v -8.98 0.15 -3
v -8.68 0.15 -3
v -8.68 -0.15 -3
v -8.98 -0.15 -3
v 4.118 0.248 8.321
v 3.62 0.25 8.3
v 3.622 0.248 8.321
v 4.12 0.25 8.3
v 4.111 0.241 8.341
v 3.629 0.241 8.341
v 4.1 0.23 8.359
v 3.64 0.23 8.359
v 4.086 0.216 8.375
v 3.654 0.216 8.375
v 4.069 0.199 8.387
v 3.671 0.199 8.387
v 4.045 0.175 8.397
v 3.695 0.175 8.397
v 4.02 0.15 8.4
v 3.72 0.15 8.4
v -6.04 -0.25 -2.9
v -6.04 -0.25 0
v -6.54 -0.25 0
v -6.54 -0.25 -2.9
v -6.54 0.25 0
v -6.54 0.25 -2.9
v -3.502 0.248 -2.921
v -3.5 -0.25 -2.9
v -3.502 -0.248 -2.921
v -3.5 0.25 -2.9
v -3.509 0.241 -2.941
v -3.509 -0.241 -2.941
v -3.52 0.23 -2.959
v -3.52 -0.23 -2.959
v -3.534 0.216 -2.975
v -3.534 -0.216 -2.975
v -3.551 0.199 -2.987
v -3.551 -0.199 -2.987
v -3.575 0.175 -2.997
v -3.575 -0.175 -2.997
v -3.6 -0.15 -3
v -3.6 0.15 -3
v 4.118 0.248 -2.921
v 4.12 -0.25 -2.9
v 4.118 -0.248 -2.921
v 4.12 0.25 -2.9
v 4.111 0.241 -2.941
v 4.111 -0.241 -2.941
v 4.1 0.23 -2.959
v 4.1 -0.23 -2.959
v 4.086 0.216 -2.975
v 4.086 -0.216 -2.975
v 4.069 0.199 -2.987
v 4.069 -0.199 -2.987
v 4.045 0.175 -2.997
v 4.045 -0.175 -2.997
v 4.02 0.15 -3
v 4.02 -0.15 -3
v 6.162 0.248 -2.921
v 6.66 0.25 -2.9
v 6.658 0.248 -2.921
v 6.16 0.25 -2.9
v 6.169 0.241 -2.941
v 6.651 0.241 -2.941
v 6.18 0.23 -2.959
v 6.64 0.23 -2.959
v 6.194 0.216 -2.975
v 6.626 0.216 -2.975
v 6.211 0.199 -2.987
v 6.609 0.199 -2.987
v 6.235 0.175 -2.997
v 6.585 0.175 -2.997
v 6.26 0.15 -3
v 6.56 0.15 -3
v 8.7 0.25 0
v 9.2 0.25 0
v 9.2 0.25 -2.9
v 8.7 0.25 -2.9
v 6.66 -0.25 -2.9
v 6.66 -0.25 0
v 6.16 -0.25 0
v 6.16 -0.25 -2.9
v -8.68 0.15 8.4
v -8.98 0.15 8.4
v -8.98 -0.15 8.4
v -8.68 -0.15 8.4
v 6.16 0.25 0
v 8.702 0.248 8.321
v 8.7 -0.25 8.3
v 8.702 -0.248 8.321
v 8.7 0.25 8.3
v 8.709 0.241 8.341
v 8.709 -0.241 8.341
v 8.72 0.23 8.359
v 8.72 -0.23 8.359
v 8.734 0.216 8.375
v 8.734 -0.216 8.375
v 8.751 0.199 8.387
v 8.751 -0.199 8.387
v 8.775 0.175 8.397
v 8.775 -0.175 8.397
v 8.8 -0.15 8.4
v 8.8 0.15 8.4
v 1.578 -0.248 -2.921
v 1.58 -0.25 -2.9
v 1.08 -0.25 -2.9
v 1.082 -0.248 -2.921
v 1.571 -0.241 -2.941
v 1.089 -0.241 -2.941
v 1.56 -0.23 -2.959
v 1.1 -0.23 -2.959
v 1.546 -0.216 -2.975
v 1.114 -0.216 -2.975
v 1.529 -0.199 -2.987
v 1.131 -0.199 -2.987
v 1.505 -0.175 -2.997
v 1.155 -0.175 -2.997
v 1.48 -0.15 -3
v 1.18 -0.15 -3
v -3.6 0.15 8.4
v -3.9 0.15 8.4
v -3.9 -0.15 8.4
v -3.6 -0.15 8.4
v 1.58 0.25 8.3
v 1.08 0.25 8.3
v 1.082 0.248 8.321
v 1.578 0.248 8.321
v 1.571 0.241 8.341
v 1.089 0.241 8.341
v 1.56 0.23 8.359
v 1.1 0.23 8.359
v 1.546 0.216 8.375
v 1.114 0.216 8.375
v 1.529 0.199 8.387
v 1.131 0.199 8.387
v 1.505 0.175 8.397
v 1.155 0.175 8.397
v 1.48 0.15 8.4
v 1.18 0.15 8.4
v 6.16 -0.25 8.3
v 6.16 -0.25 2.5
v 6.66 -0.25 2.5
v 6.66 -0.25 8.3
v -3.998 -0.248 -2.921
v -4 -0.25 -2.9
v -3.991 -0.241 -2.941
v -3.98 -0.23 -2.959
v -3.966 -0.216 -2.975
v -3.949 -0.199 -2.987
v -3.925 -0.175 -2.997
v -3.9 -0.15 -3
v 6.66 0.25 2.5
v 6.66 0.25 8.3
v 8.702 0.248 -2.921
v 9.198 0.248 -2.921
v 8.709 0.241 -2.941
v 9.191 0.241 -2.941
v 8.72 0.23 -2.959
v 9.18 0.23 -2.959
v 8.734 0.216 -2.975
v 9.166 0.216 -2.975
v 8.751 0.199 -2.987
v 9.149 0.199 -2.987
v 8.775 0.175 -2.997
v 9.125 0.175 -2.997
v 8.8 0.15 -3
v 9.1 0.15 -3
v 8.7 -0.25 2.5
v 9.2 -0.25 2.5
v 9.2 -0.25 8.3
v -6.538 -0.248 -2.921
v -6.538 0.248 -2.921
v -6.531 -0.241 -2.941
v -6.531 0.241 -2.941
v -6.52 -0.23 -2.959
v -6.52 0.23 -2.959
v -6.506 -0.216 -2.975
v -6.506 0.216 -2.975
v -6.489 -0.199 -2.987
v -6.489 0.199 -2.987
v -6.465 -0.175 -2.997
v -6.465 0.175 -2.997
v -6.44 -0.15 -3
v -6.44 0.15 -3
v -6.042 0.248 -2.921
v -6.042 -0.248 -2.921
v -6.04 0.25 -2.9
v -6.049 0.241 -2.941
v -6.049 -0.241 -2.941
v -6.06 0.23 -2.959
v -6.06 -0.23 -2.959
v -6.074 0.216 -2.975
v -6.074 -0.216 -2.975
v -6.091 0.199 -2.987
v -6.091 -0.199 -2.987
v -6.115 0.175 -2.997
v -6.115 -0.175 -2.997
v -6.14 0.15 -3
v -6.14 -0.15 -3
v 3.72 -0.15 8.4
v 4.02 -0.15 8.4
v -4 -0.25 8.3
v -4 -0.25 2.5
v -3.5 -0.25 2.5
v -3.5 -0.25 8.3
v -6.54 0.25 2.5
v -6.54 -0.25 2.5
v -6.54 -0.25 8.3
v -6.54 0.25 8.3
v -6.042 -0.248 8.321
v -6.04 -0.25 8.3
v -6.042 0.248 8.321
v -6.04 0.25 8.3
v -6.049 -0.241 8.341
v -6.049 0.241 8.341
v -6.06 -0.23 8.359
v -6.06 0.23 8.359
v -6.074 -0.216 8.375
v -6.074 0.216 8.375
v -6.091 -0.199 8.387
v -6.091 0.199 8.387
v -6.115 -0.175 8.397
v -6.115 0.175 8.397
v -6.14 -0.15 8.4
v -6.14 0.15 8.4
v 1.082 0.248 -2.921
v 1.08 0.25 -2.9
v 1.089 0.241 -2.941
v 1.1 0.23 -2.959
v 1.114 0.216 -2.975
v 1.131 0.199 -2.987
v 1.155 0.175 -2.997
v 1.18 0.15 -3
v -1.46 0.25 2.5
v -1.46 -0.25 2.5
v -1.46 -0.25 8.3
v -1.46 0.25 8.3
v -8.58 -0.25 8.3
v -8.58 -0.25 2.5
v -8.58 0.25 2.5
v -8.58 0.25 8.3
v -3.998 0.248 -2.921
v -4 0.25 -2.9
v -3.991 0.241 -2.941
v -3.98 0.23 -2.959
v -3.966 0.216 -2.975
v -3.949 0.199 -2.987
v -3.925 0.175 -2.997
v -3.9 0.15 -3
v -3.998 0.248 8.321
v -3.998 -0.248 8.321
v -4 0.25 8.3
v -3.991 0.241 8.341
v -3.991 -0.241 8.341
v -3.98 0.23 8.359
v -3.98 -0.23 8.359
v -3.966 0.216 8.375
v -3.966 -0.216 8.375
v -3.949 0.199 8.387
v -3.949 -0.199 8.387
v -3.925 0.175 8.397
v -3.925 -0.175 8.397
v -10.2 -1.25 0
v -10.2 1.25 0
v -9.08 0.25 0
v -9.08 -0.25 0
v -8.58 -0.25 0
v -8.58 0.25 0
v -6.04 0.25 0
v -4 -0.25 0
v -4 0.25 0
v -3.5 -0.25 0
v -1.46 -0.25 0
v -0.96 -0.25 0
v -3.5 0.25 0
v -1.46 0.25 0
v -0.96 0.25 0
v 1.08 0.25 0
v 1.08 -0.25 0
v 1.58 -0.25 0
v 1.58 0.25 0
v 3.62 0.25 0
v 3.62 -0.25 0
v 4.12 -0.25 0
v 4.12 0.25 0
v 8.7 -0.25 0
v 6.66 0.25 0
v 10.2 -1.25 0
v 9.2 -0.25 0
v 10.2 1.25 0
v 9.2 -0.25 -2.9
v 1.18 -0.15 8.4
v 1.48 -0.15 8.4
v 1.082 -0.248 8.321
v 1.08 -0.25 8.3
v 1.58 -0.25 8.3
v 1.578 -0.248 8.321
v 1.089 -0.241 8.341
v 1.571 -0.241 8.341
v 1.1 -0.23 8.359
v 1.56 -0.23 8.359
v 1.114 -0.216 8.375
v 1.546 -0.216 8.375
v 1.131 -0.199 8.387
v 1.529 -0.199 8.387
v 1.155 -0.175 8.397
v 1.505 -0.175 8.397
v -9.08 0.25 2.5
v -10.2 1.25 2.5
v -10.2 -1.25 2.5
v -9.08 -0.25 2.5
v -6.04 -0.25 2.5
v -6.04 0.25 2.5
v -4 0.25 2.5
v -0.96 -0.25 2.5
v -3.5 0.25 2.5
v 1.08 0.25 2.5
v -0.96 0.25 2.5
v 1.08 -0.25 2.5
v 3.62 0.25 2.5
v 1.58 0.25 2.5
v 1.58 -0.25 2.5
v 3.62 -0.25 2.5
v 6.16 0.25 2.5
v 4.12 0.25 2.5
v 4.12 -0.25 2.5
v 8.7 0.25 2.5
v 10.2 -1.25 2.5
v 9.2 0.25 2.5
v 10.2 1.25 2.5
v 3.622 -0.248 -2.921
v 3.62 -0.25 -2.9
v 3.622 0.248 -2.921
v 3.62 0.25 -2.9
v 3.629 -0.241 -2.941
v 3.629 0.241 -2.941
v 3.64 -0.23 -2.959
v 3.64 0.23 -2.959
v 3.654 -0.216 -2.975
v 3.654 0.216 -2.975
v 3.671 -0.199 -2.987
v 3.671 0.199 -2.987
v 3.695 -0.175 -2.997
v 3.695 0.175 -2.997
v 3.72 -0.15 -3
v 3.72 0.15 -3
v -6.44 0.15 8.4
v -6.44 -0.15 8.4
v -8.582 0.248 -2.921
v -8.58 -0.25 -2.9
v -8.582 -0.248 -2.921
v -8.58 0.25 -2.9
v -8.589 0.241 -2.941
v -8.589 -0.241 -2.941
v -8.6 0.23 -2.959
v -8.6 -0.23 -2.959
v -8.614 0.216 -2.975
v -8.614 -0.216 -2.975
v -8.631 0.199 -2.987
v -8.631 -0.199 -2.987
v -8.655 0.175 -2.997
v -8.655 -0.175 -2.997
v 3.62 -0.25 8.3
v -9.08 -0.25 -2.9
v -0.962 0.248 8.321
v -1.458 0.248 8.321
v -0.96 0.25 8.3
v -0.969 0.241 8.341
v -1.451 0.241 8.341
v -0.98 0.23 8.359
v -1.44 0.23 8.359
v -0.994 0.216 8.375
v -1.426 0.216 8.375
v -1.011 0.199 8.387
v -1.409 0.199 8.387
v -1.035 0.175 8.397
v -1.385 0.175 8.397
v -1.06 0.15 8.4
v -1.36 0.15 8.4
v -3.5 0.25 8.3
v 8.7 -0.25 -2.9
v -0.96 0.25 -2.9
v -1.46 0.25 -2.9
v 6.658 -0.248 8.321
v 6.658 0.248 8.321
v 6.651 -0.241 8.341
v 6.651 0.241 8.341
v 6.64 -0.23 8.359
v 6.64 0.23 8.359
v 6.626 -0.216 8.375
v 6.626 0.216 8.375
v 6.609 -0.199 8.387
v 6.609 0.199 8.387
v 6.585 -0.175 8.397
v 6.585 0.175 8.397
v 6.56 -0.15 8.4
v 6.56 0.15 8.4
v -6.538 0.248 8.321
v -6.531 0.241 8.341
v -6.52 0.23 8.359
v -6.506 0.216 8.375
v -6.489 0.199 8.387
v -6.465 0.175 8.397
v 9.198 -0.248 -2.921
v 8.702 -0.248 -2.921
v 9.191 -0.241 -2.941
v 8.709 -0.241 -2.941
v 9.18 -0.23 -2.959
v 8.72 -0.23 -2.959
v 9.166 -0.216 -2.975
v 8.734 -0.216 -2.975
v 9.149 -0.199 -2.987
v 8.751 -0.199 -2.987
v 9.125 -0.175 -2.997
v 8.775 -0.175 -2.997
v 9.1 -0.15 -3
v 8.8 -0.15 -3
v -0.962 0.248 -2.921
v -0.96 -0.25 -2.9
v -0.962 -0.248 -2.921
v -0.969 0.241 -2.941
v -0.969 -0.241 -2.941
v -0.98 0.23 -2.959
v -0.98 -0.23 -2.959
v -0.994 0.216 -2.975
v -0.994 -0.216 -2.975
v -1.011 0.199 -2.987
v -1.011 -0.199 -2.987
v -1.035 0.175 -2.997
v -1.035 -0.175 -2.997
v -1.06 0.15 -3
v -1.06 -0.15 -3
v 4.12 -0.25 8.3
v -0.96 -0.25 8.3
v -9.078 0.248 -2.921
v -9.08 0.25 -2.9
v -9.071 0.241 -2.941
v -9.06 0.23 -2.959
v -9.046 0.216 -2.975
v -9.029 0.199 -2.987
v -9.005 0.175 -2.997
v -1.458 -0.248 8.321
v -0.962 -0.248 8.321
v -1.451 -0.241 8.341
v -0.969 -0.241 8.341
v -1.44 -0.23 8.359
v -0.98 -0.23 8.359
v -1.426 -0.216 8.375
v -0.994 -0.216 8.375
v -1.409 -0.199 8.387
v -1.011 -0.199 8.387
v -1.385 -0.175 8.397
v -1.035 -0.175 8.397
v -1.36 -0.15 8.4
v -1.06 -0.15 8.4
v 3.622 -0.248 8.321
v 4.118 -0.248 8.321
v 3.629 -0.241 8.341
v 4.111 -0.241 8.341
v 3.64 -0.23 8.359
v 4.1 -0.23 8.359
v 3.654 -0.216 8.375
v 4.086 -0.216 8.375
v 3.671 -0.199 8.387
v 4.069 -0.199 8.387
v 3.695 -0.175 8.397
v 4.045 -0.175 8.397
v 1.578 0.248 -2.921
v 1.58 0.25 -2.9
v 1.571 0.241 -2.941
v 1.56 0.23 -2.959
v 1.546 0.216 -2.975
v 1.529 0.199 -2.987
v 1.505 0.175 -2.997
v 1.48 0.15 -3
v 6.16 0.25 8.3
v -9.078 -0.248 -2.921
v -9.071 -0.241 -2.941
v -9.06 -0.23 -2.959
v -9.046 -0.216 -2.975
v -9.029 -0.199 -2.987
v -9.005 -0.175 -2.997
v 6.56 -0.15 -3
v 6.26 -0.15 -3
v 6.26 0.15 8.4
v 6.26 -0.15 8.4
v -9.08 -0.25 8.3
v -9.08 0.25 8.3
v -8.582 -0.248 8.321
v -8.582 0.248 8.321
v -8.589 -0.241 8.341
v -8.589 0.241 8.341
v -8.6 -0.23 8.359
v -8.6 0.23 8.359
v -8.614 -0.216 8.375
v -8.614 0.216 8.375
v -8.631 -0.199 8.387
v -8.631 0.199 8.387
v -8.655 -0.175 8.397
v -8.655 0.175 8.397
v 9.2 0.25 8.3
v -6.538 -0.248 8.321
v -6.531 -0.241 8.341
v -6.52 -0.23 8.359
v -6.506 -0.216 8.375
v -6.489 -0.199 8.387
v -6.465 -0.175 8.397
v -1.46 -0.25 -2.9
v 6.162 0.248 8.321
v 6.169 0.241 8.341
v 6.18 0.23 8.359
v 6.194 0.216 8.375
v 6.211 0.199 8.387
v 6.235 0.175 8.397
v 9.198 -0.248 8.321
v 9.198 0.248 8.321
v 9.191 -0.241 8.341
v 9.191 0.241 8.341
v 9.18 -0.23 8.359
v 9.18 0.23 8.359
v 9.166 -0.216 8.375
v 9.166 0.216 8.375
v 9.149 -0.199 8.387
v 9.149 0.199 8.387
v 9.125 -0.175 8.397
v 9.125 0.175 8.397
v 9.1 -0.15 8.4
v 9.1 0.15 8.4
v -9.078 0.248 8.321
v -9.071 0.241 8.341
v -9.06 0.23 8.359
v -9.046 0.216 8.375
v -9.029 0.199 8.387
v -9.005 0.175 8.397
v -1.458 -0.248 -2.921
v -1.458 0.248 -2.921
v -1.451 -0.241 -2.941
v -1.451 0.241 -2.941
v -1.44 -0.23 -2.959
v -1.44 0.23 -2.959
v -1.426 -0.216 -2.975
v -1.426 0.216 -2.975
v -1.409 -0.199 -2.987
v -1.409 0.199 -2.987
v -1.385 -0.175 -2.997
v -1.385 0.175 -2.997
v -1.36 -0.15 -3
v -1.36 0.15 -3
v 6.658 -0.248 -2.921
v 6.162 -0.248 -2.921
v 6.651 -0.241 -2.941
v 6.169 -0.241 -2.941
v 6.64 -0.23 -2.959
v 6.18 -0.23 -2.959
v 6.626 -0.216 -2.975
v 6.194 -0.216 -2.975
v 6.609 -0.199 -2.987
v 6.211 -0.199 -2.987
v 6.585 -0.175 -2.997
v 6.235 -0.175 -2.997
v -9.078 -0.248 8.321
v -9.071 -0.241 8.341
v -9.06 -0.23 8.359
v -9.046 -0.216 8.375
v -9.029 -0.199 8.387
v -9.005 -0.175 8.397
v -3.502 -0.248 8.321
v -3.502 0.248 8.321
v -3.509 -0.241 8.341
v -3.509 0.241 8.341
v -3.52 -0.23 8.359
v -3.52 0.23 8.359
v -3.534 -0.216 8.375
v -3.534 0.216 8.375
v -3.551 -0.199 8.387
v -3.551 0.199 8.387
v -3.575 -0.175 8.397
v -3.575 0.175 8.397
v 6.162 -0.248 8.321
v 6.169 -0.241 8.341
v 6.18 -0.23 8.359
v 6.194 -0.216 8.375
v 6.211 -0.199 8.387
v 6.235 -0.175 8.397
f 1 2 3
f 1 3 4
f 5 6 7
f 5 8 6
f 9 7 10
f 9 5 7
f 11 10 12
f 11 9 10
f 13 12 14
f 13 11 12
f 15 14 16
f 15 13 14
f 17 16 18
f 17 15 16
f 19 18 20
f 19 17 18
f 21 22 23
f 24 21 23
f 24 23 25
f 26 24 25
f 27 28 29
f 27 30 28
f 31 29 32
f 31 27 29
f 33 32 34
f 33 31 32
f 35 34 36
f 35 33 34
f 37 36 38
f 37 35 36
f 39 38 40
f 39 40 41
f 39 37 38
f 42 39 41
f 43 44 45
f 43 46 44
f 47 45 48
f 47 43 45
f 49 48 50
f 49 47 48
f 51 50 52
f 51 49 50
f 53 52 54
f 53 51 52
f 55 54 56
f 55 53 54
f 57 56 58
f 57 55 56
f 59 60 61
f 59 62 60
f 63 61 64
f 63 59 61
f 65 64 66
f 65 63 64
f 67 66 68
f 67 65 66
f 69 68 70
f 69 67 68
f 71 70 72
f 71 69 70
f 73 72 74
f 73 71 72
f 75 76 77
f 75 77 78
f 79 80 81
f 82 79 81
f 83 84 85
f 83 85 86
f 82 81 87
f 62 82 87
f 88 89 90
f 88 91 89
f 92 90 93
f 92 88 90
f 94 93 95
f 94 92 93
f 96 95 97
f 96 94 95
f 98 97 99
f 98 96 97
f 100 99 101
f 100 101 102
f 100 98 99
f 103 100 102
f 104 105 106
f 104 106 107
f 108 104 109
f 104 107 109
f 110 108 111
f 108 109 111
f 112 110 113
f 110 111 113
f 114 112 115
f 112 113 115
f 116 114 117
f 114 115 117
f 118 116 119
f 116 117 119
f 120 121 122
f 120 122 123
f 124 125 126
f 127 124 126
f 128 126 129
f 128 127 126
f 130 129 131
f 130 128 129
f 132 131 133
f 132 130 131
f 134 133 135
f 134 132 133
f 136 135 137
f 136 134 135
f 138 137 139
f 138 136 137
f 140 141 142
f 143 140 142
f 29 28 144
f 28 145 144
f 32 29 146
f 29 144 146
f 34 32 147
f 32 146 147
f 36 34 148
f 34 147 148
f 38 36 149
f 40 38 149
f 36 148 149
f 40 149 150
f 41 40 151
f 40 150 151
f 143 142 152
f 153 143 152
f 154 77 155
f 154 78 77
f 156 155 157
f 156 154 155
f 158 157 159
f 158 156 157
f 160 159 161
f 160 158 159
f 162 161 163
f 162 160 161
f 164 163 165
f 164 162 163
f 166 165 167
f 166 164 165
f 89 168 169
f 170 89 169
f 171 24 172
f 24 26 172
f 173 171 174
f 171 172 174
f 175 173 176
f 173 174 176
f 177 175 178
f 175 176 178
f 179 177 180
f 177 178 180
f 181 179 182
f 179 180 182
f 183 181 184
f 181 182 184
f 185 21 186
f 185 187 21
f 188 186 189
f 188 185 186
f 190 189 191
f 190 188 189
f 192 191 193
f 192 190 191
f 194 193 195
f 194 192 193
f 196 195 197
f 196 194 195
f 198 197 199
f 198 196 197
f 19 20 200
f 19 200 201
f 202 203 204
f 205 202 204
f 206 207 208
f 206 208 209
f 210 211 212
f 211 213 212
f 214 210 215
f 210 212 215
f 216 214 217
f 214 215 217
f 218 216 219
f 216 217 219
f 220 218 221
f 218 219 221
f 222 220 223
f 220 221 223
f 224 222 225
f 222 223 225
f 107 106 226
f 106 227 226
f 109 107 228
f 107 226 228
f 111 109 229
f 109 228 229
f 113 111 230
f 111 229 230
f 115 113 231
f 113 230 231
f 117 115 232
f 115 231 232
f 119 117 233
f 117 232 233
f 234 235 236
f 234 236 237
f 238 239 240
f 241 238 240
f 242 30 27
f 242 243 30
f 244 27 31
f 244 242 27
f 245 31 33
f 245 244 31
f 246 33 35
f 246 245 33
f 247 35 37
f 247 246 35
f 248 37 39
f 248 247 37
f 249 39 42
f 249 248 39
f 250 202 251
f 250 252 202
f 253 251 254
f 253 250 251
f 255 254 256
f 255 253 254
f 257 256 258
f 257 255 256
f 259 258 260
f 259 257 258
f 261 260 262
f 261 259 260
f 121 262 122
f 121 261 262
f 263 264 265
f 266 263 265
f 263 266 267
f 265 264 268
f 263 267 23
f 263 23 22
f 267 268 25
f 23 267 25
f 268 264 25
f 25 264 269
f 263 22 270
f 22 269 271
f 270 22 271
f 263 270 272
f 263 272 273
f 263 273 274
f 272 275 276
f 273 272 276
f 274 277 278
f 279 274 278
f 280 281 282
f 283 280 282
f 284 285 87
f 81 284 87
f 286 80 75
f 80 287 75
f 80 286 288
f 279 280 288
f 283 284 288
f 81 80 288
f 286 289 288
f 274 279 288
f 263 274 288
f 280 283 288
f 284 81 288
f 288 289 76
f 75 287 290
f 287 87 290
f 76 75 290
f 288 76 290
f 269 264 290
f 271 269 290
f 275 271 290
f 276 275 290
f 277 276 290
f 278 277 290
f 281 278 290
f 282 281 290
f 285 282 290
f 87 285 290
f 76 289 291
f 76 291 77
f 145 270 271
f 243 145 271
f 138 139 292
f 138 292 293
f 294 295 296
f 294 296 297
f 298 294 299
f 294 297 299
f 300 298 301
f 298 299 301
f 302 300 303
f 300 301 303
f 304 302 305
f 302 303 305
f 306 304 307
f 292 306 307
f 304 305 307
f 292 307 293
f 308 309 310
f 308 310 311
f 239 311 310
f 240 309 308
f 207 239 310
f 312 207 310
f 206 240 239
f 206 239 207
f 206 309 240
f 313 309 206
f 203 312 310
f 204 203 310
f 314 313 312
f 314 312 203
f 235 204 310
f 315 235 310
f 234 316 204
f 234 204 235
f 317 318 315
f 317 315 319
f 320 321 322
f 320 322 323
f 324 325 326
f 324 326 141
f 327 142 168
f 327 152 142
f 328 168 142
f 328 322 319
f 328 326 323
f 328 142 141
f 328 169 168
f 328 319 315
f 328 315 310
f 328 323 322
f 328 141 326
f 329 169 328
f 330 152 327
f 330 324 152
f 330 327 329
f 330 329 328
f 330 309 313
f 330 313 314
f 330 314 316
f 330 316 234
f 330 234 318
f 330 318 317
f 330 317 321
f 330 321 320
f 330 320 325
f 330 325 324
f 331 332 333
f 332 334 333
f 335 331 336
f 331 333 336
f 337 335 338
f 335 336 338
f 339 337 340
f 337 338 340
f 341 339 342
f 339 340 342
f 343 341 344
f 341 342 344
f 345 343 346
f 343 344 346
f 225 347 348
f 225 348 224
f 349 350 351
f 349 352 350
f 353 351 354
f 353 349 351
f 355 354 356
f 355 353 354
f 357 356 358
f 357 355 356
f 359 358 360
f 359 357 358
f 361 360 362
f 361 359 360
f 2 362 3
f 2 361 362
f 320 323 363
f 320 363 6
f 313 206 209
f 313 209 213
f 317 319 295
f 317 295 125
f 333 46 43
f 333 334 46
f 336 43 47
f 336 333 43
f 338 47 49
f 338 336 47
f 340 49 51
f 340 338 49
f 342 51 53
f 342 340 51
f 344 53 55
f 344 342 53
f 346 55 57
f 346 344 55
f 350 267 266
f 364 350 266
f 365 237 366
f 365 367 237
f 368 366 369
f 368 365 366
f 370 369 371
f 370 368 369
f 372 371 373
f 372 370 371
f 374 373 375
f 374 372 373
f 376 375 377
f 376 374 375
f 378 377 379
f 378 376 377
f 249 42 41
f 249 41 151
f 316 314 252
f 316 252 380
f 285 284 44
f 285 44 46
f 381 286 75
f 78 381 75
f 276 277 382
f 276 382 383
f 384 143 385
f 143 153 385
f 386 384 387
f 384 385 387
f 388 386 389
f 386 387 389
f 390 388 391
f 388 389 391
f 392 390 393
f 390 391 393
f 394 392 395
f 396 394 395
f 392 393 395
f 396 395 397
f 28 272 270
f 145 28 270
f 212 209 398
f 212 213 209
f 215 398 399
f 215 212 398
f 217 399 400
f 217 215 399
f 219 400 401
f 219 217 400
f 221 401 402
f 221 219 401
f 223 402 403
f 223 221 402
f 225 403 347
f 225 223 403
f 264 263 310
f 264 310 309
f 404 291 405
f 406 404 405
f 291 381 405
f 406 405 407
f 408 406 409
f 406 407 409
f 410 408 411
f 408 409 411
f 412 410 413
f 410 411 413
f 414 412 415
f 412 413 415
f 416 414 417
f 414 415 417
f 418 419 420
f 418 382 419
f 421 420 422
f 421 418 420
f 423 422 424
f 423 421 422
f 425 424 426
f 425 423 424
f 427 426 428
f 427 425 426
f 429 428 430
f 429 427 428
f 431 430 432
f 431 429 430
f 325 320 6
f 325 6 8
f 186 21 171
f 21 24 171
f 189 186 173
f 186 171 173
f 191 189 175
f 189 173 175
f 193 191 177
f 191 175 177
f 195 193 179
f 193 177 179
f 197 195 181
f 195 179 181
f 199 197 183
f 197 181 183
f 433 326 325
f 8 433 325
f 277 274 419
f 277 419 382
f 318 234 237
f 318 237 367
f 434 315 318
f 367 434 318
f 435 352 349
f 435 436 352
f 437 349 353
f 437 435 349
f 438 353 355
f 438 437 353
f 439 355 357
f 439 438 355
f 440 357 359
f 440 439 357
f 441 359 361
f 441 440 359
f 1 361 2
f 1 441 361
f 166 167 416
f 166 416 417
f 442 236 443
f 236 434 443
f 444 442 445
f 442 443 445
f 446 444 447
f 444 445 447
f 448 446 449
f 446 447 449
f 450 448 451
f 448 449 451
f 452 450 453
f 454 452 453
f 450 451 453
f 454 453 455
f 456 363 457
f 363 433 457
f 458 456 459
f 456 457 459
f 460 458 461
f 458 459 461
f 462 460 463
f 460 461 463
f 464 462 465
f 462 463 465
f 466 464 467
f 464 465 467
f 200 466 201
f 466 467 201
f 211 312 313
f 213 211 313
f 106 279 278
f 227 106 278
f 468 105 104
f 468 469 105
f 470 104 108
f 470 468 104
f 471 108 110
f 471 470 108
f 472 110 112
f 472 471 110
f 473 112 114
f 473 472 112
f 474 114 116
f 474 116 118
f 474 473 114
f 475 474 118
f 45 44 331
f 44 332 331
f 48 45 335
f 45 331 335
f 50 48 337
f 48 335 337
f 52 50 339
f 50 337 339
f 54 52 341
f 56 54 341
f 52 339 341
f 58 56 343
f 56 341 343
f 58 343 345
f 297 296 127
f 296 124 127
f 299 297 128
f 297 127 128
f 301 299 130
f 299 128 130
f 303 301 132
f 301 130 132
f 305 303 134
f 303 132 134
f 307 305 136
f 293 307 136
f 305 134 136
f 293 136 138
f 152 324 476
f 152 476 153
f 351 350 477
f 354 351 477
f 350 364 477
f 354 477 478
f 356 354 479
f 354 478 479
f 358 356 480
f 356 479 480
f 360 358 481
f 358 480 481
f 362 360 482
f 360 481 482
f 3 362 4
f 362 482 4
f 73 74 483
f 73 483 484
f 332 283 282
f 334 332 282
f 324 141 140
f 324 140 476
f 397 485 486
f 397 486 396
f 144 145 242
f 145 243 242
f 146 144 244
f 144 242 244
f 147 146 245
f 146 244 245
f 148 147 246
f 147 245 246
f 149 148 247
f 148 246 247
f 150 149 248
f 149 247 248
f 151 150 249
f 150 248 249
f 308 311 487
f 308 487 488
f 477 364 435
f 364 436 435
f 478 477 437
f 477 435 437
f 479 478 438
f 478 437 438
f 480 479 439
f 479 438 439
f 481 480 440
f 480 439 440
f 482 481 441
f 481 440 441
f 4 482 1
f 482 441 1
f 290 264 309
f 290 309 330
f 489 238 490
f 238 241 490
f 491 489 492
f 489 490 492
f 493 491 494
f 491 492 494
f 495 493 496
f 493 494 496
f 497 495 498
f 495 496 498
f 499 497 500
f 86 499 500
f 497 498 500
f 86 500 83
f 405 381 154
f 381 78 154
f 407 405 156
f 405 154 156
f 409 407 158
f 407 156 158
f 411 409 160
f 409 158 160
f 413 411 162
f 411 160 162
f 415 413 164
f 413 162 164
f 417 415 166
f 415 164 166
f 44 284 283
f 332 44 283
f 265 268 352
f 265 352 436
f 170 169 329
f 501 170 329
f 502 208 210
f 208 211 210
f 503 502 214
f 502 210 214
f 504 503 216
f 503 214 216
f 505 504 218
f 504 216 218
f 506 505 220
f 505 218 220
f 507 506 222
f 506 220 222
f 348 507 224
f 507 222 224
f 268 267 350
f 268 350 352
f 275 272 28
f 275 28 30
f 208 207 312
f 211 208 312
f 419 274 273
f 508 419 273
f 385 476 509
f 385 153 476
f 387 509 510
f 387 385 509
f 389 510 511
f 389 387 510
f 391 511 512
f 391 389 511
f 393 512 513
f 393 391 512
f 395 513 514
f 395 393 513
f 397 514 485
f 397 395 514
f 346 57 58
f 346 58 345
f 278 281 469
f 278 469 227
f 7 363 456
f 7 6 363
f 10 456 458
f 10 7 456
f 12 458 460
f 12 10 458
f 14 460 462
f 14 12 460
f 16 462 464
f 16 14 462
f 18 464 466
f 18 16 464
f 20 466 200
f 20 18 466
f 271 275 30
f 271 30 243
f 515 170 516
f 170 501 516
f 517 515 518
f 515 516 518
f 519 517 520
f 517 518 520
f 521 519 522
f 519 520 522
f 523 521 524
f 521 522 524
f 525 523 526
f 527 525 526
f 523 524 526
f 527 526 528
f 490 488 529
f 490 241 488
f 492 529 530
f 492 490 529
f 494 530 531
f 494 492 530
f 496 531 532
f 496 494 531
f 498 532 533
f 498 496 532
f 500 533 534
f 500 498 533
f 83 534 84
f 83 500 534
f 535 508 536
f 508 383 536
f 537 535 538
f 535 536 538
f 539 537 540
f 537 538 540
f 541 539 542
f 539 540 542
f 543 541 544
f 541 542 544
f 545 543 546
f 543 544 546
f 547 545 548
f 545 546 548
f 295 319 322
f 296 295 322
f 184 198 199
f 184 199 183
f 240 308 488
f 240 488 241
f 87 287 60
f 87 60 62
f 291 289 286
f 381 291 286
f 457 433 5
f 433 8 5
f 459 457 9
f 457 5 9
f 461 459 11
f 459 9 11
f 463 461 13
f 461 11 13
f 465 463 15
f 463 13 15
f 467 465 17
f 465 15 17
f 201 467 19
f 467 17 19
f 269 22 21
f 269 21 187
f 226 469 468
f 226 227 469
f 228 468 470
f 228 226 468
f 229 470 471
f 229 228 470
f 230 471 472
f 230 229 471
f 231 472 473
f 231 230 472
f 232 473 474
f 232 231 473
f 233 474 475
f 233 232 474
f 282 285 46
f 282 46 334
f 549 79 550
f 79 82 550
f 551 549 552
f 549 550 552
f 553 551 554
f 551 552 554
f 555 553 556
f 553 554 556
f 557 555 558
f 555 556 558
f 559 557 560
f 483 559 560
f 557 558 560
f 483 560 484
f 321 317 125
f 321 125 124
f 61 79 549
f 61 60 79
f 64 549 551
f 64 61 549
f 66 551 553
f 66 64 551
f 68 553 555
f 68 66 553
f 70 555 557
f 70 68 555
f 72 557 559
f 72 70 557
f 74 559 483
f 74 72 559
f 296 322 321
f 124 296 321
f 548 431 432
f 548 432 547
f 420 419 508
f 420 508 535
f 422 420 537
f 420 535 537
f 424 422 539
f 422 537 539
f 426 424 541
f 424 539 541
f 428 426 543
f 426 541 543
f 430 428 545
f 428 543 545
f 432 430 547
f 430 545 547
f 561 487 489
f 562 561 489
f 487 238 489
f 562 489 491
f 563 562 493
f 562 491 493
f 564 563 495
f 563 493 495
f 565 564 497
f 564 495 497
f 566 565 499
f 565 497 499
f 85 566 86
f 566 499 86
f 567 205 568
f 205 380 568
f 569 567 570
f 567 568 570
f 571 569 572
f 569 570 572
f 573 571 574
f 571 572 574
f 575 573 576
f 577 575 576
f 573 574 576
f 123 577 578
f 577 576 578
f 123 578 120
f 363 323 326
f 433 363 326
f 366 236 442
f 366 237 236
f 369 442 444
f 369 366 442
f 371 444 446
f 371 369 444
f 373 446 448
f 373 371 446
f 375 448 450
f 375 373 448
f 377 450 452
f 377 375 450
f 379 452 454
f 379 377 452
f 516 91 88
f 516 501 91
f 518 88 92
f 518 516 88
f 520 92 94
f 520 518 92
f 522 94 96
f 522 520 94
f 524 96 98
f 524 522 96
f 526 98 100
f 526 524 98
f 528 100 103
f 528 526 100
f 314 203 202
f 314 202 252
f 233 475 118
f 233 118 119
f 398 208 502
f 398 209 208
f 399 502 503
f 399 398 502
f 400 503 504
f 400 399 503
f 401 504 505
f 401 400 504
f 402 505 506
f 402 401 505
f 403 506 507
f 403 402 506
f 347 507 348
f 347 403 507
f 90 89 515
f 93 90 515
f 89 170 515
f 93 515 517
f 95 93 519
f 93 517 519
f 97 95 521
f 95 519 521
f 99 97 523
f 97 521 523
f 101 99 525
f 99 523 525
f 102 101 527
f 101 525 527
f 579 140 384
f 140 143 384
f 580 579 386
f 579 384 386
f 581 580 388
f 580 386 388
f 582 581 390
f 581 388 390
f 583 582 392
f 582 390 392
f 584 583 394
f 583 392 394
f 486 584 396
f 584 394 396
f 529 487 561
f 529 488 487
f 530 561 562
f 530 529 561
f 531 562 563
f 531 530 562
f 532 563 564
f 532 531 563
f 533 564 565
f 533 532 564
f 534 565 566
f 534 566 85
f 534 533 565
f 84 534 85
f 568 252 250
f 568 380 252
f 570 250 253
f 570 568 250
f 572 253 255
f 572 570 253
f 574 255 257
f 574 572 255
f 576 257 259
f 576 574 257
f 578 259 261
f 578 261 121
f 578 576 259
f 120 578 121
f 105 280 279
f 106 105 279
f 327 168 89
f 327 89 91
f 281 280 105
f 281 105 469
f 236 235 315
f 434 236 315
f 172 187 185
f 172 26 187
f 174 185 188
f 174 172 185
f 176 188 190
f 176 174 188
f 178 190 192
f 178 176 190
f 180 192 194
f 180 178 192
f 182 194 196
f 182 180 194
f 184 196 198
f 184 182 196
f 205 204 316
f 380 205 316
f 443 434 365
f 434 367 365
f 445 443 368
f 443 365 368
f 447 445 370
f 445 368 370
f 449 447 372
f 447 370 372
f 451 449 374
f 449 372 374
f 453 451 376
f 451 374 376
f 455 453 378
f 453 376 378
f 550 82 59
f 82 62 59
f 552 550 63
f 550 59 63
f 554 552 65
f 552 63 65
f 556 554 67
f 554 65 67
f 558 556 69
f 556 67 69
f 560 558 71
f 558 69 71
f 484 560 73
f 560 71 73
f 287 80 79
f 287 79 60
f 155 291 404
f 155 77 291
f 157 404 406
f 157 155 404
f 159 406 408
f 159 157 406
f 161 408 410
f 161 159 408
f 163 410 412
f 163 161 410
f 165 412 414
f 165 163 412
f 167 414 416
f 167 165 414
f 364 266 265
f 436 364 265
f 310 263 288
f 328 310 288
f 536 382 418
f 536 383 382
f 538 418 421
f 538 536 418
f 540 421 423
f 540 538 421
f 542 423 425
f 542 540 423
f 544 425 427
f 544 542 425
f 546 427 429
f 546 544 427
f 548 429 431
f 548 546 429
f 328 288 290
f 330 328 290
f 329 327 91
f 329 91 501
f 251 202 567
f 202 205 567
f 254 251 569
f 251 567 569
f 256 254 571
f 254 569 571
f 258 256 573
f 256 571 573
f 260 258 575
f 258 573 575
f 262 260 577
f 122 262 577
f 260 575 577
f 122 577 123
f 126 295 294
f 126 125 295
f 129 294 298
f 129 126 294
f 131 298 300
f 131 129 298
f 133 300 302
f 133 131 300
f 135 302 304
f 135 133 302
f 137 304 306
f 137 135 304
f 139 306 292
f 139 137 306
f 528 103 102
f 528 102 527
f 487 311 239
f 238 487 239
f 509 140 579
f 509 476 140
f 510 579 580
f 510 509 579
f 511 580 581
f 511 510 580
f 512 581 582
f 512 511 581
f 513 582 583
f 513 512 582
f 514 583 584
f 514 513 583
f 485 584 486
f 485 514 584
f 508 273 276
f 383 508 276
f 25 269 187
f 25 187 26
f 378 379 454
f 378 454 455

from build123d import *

# Parameters (mm, degrees)
SKETCH1_W              = 20.4
SKETCH1_H              = 2.5
BOSS_EXTRUDE1_DEPTH    = 2.5
SKETCH2_W              = 0.5
SKETCH2_H              = 0.5
BOSS_EXTRUDE2_DEPTH    = 5.9
FILLET1_R              = 0.1
LPATTERN1_COUNT        = 8
LPATTERN1_PITCH        = 2.54
FILLET1_OF_LPATTERN1_R = 0.1
SKETCH4_W              = 0.5
SKETCH4_H              = 0.5
BOSS_EXTRUDE3_DEPTH    = 3
FILLET2_R              = 0.1
LPATTERN2_COUNT        = 8
LPATTERN2_PITCH        = 2.54
FILLET2_OF_LPATTERN2_R = 0.1


with BuildPart() as part:
    # Sketch1 → Boss-Extrude1 (new body)
    with BuildSketch(Plane.XY):
        Rectangle(SKETCH1_W, SKETCH1_H)
    extrude(amount=BOSS_EXTRUDE1_DEPTH)

    # Sketch2 → Boss-Extrude2 (add)
    with BuildSketch(Plane.XY.offset(2.5)):
        with Locations((8.95, 0)):
            Rectangle(SKETCH2_W, SKETCH2_H)
    boss_extrude2 = extrude(amount=BOSS_EXTRUDE2_DEPTH)

    # Fillet1
    fillet1_edges = [part.edges().sort_by_distance(p)[0] for p in [
        (9.2, 0, 8.4),
        (8.95, 0.25, 8.4),
        (8.7, 0, 8.4),
        (8.95, -0.25, 8.4),
    ]]
    fillet(fillet1_edges, radius=FILLET1_R)

    # LPattern1: Boss-Extrude2 ×8
    with Locations(*[(-i * LPATTERN1_PITCH, 0, 0) for i in range(1, LPATTERN1_COUNT)]):
        add(boss_extrude2)

    # Fillet1 of LPattern1
    fillet1_of_lpattern1_edges = [part.edges().sort_by_distance(p)[0] for p in [
        (6.66, 0, 8.4),
        (6.41, 0.25, 8.4),
        (6.16, 0, 8.4),
        (6.41, -0.25, 8.4),
        (4.12, 0, 8.4),
        (3.87, 0.25, 8.4),
        (3.62, 0, 8.4),
        (3.87, -0.25, 8.4),
        (1.58, 0, 8.4),
        (1.33, 0.25, 8.4),
        (1.08, 0, 8.4),
        (1.33, -0.25, 8.4),
        (-0.96, 0, 8.4),
        (-1.21, 0.25, 8.4),
        (-1.46, 0, 8.4),
        (-1.21, -0.25, 8.4),
        (-3.5, 0, 8.4),
        (-3.75, 0.25, 8.4),
        (-4, 0, 8.4),
        (-3.75, -0.25, 8.4),
        (-6.04, 0, 8.4),
        (-6.29, 0.25, 8.4),
        (-6.54, 0, 8.4),
        (-6.29, -0.25, 8.4),
        (-8.58, 0, 8.4),
        (-8.83, 0.25, 8.4),
        (-9.08, 0, 8.4),
        (-8.83, -0.25, 8.4),
    ]]
    fillet(fillet1_of_lpattern1_edges, radius=FILLET1_OF_LPATTERN1_R)

    # Sketch4 → Boss-Extrude3 (add)
    with BuildSketch(Plane(origin=(0, 0, 0), x_dir=(-1, 0, 0), z_dir=(0, 0, -1))):
        with Locations((-8.95, 0)):
            Rectangle(SKETCH4_W, SKETCH4_H)
    boss_extrude3 = extrude(amount=BOSS_EXTRUDE3_DEPTH)

    # Fillet2
    fillet2_edges = [part.edges().sort_by_distance(p)[0] for p in [
        (8.95, 0.25, -3),
        (9.2, 0, -3),
        (8.95, -0.25, -3),
        (8.7, 0, -3),
    ]]
    fillet(fillet2_edges, radius=FILLET2_R)

    # LPattern2: Boss-Extrude3 ×8
    with Locations(*[(-i * LPATTERN2_PITCH, 0, 0) for i in range(1, LPATTERN2_COUNT)]):
        add(boss_extrude3)

    # Fillet2 of LPattern2
    fillet2_of_lpattern2_edges = [part.edges().sort_by_distance(p)[0] for p in [
        (6.41, 0.25, -3),
        (6.66, 0, -3),
        (6.41, -0.25, -3),
        (6.16, 0, -3),
        (3.87, 0.25, -3),
        (4.12, 0, -3),
        (3.87, -0.25, -3),
        (3.62, 0, -3),
        (1.33, 0.25, -3),
        (1.58, 0, -3),
        (1.33, -0.25, -3),
        (1.08, 0, -3),
        (-1.21, 0.25, -3),
        (-0.96, 0, -3),
        (-1.21, -0.25, -3),
        (-1.46, 0, -3),
        (-3.75, 0.25, -3),
        (-3.5, 0, -3),
        (-3.75, -0.25, -3),
        (-4, 0, -3),
        (-6.29, 0.25, -3),
        (-6.04, 0, -3),
        (-6.29, -0.25, -3),
        (-6.54, 0, -3),
        (-8.83, 0.25, -3),
        (-8.58, 0, -3),
        (-8.83, -0.25, -3),
        (-9.08, 0, -3),
    ]]
    fillet(fillet2_of_lpattern2_edges, radius=FILLET2_OF_LPATTERN2_R)


solid = part.part
